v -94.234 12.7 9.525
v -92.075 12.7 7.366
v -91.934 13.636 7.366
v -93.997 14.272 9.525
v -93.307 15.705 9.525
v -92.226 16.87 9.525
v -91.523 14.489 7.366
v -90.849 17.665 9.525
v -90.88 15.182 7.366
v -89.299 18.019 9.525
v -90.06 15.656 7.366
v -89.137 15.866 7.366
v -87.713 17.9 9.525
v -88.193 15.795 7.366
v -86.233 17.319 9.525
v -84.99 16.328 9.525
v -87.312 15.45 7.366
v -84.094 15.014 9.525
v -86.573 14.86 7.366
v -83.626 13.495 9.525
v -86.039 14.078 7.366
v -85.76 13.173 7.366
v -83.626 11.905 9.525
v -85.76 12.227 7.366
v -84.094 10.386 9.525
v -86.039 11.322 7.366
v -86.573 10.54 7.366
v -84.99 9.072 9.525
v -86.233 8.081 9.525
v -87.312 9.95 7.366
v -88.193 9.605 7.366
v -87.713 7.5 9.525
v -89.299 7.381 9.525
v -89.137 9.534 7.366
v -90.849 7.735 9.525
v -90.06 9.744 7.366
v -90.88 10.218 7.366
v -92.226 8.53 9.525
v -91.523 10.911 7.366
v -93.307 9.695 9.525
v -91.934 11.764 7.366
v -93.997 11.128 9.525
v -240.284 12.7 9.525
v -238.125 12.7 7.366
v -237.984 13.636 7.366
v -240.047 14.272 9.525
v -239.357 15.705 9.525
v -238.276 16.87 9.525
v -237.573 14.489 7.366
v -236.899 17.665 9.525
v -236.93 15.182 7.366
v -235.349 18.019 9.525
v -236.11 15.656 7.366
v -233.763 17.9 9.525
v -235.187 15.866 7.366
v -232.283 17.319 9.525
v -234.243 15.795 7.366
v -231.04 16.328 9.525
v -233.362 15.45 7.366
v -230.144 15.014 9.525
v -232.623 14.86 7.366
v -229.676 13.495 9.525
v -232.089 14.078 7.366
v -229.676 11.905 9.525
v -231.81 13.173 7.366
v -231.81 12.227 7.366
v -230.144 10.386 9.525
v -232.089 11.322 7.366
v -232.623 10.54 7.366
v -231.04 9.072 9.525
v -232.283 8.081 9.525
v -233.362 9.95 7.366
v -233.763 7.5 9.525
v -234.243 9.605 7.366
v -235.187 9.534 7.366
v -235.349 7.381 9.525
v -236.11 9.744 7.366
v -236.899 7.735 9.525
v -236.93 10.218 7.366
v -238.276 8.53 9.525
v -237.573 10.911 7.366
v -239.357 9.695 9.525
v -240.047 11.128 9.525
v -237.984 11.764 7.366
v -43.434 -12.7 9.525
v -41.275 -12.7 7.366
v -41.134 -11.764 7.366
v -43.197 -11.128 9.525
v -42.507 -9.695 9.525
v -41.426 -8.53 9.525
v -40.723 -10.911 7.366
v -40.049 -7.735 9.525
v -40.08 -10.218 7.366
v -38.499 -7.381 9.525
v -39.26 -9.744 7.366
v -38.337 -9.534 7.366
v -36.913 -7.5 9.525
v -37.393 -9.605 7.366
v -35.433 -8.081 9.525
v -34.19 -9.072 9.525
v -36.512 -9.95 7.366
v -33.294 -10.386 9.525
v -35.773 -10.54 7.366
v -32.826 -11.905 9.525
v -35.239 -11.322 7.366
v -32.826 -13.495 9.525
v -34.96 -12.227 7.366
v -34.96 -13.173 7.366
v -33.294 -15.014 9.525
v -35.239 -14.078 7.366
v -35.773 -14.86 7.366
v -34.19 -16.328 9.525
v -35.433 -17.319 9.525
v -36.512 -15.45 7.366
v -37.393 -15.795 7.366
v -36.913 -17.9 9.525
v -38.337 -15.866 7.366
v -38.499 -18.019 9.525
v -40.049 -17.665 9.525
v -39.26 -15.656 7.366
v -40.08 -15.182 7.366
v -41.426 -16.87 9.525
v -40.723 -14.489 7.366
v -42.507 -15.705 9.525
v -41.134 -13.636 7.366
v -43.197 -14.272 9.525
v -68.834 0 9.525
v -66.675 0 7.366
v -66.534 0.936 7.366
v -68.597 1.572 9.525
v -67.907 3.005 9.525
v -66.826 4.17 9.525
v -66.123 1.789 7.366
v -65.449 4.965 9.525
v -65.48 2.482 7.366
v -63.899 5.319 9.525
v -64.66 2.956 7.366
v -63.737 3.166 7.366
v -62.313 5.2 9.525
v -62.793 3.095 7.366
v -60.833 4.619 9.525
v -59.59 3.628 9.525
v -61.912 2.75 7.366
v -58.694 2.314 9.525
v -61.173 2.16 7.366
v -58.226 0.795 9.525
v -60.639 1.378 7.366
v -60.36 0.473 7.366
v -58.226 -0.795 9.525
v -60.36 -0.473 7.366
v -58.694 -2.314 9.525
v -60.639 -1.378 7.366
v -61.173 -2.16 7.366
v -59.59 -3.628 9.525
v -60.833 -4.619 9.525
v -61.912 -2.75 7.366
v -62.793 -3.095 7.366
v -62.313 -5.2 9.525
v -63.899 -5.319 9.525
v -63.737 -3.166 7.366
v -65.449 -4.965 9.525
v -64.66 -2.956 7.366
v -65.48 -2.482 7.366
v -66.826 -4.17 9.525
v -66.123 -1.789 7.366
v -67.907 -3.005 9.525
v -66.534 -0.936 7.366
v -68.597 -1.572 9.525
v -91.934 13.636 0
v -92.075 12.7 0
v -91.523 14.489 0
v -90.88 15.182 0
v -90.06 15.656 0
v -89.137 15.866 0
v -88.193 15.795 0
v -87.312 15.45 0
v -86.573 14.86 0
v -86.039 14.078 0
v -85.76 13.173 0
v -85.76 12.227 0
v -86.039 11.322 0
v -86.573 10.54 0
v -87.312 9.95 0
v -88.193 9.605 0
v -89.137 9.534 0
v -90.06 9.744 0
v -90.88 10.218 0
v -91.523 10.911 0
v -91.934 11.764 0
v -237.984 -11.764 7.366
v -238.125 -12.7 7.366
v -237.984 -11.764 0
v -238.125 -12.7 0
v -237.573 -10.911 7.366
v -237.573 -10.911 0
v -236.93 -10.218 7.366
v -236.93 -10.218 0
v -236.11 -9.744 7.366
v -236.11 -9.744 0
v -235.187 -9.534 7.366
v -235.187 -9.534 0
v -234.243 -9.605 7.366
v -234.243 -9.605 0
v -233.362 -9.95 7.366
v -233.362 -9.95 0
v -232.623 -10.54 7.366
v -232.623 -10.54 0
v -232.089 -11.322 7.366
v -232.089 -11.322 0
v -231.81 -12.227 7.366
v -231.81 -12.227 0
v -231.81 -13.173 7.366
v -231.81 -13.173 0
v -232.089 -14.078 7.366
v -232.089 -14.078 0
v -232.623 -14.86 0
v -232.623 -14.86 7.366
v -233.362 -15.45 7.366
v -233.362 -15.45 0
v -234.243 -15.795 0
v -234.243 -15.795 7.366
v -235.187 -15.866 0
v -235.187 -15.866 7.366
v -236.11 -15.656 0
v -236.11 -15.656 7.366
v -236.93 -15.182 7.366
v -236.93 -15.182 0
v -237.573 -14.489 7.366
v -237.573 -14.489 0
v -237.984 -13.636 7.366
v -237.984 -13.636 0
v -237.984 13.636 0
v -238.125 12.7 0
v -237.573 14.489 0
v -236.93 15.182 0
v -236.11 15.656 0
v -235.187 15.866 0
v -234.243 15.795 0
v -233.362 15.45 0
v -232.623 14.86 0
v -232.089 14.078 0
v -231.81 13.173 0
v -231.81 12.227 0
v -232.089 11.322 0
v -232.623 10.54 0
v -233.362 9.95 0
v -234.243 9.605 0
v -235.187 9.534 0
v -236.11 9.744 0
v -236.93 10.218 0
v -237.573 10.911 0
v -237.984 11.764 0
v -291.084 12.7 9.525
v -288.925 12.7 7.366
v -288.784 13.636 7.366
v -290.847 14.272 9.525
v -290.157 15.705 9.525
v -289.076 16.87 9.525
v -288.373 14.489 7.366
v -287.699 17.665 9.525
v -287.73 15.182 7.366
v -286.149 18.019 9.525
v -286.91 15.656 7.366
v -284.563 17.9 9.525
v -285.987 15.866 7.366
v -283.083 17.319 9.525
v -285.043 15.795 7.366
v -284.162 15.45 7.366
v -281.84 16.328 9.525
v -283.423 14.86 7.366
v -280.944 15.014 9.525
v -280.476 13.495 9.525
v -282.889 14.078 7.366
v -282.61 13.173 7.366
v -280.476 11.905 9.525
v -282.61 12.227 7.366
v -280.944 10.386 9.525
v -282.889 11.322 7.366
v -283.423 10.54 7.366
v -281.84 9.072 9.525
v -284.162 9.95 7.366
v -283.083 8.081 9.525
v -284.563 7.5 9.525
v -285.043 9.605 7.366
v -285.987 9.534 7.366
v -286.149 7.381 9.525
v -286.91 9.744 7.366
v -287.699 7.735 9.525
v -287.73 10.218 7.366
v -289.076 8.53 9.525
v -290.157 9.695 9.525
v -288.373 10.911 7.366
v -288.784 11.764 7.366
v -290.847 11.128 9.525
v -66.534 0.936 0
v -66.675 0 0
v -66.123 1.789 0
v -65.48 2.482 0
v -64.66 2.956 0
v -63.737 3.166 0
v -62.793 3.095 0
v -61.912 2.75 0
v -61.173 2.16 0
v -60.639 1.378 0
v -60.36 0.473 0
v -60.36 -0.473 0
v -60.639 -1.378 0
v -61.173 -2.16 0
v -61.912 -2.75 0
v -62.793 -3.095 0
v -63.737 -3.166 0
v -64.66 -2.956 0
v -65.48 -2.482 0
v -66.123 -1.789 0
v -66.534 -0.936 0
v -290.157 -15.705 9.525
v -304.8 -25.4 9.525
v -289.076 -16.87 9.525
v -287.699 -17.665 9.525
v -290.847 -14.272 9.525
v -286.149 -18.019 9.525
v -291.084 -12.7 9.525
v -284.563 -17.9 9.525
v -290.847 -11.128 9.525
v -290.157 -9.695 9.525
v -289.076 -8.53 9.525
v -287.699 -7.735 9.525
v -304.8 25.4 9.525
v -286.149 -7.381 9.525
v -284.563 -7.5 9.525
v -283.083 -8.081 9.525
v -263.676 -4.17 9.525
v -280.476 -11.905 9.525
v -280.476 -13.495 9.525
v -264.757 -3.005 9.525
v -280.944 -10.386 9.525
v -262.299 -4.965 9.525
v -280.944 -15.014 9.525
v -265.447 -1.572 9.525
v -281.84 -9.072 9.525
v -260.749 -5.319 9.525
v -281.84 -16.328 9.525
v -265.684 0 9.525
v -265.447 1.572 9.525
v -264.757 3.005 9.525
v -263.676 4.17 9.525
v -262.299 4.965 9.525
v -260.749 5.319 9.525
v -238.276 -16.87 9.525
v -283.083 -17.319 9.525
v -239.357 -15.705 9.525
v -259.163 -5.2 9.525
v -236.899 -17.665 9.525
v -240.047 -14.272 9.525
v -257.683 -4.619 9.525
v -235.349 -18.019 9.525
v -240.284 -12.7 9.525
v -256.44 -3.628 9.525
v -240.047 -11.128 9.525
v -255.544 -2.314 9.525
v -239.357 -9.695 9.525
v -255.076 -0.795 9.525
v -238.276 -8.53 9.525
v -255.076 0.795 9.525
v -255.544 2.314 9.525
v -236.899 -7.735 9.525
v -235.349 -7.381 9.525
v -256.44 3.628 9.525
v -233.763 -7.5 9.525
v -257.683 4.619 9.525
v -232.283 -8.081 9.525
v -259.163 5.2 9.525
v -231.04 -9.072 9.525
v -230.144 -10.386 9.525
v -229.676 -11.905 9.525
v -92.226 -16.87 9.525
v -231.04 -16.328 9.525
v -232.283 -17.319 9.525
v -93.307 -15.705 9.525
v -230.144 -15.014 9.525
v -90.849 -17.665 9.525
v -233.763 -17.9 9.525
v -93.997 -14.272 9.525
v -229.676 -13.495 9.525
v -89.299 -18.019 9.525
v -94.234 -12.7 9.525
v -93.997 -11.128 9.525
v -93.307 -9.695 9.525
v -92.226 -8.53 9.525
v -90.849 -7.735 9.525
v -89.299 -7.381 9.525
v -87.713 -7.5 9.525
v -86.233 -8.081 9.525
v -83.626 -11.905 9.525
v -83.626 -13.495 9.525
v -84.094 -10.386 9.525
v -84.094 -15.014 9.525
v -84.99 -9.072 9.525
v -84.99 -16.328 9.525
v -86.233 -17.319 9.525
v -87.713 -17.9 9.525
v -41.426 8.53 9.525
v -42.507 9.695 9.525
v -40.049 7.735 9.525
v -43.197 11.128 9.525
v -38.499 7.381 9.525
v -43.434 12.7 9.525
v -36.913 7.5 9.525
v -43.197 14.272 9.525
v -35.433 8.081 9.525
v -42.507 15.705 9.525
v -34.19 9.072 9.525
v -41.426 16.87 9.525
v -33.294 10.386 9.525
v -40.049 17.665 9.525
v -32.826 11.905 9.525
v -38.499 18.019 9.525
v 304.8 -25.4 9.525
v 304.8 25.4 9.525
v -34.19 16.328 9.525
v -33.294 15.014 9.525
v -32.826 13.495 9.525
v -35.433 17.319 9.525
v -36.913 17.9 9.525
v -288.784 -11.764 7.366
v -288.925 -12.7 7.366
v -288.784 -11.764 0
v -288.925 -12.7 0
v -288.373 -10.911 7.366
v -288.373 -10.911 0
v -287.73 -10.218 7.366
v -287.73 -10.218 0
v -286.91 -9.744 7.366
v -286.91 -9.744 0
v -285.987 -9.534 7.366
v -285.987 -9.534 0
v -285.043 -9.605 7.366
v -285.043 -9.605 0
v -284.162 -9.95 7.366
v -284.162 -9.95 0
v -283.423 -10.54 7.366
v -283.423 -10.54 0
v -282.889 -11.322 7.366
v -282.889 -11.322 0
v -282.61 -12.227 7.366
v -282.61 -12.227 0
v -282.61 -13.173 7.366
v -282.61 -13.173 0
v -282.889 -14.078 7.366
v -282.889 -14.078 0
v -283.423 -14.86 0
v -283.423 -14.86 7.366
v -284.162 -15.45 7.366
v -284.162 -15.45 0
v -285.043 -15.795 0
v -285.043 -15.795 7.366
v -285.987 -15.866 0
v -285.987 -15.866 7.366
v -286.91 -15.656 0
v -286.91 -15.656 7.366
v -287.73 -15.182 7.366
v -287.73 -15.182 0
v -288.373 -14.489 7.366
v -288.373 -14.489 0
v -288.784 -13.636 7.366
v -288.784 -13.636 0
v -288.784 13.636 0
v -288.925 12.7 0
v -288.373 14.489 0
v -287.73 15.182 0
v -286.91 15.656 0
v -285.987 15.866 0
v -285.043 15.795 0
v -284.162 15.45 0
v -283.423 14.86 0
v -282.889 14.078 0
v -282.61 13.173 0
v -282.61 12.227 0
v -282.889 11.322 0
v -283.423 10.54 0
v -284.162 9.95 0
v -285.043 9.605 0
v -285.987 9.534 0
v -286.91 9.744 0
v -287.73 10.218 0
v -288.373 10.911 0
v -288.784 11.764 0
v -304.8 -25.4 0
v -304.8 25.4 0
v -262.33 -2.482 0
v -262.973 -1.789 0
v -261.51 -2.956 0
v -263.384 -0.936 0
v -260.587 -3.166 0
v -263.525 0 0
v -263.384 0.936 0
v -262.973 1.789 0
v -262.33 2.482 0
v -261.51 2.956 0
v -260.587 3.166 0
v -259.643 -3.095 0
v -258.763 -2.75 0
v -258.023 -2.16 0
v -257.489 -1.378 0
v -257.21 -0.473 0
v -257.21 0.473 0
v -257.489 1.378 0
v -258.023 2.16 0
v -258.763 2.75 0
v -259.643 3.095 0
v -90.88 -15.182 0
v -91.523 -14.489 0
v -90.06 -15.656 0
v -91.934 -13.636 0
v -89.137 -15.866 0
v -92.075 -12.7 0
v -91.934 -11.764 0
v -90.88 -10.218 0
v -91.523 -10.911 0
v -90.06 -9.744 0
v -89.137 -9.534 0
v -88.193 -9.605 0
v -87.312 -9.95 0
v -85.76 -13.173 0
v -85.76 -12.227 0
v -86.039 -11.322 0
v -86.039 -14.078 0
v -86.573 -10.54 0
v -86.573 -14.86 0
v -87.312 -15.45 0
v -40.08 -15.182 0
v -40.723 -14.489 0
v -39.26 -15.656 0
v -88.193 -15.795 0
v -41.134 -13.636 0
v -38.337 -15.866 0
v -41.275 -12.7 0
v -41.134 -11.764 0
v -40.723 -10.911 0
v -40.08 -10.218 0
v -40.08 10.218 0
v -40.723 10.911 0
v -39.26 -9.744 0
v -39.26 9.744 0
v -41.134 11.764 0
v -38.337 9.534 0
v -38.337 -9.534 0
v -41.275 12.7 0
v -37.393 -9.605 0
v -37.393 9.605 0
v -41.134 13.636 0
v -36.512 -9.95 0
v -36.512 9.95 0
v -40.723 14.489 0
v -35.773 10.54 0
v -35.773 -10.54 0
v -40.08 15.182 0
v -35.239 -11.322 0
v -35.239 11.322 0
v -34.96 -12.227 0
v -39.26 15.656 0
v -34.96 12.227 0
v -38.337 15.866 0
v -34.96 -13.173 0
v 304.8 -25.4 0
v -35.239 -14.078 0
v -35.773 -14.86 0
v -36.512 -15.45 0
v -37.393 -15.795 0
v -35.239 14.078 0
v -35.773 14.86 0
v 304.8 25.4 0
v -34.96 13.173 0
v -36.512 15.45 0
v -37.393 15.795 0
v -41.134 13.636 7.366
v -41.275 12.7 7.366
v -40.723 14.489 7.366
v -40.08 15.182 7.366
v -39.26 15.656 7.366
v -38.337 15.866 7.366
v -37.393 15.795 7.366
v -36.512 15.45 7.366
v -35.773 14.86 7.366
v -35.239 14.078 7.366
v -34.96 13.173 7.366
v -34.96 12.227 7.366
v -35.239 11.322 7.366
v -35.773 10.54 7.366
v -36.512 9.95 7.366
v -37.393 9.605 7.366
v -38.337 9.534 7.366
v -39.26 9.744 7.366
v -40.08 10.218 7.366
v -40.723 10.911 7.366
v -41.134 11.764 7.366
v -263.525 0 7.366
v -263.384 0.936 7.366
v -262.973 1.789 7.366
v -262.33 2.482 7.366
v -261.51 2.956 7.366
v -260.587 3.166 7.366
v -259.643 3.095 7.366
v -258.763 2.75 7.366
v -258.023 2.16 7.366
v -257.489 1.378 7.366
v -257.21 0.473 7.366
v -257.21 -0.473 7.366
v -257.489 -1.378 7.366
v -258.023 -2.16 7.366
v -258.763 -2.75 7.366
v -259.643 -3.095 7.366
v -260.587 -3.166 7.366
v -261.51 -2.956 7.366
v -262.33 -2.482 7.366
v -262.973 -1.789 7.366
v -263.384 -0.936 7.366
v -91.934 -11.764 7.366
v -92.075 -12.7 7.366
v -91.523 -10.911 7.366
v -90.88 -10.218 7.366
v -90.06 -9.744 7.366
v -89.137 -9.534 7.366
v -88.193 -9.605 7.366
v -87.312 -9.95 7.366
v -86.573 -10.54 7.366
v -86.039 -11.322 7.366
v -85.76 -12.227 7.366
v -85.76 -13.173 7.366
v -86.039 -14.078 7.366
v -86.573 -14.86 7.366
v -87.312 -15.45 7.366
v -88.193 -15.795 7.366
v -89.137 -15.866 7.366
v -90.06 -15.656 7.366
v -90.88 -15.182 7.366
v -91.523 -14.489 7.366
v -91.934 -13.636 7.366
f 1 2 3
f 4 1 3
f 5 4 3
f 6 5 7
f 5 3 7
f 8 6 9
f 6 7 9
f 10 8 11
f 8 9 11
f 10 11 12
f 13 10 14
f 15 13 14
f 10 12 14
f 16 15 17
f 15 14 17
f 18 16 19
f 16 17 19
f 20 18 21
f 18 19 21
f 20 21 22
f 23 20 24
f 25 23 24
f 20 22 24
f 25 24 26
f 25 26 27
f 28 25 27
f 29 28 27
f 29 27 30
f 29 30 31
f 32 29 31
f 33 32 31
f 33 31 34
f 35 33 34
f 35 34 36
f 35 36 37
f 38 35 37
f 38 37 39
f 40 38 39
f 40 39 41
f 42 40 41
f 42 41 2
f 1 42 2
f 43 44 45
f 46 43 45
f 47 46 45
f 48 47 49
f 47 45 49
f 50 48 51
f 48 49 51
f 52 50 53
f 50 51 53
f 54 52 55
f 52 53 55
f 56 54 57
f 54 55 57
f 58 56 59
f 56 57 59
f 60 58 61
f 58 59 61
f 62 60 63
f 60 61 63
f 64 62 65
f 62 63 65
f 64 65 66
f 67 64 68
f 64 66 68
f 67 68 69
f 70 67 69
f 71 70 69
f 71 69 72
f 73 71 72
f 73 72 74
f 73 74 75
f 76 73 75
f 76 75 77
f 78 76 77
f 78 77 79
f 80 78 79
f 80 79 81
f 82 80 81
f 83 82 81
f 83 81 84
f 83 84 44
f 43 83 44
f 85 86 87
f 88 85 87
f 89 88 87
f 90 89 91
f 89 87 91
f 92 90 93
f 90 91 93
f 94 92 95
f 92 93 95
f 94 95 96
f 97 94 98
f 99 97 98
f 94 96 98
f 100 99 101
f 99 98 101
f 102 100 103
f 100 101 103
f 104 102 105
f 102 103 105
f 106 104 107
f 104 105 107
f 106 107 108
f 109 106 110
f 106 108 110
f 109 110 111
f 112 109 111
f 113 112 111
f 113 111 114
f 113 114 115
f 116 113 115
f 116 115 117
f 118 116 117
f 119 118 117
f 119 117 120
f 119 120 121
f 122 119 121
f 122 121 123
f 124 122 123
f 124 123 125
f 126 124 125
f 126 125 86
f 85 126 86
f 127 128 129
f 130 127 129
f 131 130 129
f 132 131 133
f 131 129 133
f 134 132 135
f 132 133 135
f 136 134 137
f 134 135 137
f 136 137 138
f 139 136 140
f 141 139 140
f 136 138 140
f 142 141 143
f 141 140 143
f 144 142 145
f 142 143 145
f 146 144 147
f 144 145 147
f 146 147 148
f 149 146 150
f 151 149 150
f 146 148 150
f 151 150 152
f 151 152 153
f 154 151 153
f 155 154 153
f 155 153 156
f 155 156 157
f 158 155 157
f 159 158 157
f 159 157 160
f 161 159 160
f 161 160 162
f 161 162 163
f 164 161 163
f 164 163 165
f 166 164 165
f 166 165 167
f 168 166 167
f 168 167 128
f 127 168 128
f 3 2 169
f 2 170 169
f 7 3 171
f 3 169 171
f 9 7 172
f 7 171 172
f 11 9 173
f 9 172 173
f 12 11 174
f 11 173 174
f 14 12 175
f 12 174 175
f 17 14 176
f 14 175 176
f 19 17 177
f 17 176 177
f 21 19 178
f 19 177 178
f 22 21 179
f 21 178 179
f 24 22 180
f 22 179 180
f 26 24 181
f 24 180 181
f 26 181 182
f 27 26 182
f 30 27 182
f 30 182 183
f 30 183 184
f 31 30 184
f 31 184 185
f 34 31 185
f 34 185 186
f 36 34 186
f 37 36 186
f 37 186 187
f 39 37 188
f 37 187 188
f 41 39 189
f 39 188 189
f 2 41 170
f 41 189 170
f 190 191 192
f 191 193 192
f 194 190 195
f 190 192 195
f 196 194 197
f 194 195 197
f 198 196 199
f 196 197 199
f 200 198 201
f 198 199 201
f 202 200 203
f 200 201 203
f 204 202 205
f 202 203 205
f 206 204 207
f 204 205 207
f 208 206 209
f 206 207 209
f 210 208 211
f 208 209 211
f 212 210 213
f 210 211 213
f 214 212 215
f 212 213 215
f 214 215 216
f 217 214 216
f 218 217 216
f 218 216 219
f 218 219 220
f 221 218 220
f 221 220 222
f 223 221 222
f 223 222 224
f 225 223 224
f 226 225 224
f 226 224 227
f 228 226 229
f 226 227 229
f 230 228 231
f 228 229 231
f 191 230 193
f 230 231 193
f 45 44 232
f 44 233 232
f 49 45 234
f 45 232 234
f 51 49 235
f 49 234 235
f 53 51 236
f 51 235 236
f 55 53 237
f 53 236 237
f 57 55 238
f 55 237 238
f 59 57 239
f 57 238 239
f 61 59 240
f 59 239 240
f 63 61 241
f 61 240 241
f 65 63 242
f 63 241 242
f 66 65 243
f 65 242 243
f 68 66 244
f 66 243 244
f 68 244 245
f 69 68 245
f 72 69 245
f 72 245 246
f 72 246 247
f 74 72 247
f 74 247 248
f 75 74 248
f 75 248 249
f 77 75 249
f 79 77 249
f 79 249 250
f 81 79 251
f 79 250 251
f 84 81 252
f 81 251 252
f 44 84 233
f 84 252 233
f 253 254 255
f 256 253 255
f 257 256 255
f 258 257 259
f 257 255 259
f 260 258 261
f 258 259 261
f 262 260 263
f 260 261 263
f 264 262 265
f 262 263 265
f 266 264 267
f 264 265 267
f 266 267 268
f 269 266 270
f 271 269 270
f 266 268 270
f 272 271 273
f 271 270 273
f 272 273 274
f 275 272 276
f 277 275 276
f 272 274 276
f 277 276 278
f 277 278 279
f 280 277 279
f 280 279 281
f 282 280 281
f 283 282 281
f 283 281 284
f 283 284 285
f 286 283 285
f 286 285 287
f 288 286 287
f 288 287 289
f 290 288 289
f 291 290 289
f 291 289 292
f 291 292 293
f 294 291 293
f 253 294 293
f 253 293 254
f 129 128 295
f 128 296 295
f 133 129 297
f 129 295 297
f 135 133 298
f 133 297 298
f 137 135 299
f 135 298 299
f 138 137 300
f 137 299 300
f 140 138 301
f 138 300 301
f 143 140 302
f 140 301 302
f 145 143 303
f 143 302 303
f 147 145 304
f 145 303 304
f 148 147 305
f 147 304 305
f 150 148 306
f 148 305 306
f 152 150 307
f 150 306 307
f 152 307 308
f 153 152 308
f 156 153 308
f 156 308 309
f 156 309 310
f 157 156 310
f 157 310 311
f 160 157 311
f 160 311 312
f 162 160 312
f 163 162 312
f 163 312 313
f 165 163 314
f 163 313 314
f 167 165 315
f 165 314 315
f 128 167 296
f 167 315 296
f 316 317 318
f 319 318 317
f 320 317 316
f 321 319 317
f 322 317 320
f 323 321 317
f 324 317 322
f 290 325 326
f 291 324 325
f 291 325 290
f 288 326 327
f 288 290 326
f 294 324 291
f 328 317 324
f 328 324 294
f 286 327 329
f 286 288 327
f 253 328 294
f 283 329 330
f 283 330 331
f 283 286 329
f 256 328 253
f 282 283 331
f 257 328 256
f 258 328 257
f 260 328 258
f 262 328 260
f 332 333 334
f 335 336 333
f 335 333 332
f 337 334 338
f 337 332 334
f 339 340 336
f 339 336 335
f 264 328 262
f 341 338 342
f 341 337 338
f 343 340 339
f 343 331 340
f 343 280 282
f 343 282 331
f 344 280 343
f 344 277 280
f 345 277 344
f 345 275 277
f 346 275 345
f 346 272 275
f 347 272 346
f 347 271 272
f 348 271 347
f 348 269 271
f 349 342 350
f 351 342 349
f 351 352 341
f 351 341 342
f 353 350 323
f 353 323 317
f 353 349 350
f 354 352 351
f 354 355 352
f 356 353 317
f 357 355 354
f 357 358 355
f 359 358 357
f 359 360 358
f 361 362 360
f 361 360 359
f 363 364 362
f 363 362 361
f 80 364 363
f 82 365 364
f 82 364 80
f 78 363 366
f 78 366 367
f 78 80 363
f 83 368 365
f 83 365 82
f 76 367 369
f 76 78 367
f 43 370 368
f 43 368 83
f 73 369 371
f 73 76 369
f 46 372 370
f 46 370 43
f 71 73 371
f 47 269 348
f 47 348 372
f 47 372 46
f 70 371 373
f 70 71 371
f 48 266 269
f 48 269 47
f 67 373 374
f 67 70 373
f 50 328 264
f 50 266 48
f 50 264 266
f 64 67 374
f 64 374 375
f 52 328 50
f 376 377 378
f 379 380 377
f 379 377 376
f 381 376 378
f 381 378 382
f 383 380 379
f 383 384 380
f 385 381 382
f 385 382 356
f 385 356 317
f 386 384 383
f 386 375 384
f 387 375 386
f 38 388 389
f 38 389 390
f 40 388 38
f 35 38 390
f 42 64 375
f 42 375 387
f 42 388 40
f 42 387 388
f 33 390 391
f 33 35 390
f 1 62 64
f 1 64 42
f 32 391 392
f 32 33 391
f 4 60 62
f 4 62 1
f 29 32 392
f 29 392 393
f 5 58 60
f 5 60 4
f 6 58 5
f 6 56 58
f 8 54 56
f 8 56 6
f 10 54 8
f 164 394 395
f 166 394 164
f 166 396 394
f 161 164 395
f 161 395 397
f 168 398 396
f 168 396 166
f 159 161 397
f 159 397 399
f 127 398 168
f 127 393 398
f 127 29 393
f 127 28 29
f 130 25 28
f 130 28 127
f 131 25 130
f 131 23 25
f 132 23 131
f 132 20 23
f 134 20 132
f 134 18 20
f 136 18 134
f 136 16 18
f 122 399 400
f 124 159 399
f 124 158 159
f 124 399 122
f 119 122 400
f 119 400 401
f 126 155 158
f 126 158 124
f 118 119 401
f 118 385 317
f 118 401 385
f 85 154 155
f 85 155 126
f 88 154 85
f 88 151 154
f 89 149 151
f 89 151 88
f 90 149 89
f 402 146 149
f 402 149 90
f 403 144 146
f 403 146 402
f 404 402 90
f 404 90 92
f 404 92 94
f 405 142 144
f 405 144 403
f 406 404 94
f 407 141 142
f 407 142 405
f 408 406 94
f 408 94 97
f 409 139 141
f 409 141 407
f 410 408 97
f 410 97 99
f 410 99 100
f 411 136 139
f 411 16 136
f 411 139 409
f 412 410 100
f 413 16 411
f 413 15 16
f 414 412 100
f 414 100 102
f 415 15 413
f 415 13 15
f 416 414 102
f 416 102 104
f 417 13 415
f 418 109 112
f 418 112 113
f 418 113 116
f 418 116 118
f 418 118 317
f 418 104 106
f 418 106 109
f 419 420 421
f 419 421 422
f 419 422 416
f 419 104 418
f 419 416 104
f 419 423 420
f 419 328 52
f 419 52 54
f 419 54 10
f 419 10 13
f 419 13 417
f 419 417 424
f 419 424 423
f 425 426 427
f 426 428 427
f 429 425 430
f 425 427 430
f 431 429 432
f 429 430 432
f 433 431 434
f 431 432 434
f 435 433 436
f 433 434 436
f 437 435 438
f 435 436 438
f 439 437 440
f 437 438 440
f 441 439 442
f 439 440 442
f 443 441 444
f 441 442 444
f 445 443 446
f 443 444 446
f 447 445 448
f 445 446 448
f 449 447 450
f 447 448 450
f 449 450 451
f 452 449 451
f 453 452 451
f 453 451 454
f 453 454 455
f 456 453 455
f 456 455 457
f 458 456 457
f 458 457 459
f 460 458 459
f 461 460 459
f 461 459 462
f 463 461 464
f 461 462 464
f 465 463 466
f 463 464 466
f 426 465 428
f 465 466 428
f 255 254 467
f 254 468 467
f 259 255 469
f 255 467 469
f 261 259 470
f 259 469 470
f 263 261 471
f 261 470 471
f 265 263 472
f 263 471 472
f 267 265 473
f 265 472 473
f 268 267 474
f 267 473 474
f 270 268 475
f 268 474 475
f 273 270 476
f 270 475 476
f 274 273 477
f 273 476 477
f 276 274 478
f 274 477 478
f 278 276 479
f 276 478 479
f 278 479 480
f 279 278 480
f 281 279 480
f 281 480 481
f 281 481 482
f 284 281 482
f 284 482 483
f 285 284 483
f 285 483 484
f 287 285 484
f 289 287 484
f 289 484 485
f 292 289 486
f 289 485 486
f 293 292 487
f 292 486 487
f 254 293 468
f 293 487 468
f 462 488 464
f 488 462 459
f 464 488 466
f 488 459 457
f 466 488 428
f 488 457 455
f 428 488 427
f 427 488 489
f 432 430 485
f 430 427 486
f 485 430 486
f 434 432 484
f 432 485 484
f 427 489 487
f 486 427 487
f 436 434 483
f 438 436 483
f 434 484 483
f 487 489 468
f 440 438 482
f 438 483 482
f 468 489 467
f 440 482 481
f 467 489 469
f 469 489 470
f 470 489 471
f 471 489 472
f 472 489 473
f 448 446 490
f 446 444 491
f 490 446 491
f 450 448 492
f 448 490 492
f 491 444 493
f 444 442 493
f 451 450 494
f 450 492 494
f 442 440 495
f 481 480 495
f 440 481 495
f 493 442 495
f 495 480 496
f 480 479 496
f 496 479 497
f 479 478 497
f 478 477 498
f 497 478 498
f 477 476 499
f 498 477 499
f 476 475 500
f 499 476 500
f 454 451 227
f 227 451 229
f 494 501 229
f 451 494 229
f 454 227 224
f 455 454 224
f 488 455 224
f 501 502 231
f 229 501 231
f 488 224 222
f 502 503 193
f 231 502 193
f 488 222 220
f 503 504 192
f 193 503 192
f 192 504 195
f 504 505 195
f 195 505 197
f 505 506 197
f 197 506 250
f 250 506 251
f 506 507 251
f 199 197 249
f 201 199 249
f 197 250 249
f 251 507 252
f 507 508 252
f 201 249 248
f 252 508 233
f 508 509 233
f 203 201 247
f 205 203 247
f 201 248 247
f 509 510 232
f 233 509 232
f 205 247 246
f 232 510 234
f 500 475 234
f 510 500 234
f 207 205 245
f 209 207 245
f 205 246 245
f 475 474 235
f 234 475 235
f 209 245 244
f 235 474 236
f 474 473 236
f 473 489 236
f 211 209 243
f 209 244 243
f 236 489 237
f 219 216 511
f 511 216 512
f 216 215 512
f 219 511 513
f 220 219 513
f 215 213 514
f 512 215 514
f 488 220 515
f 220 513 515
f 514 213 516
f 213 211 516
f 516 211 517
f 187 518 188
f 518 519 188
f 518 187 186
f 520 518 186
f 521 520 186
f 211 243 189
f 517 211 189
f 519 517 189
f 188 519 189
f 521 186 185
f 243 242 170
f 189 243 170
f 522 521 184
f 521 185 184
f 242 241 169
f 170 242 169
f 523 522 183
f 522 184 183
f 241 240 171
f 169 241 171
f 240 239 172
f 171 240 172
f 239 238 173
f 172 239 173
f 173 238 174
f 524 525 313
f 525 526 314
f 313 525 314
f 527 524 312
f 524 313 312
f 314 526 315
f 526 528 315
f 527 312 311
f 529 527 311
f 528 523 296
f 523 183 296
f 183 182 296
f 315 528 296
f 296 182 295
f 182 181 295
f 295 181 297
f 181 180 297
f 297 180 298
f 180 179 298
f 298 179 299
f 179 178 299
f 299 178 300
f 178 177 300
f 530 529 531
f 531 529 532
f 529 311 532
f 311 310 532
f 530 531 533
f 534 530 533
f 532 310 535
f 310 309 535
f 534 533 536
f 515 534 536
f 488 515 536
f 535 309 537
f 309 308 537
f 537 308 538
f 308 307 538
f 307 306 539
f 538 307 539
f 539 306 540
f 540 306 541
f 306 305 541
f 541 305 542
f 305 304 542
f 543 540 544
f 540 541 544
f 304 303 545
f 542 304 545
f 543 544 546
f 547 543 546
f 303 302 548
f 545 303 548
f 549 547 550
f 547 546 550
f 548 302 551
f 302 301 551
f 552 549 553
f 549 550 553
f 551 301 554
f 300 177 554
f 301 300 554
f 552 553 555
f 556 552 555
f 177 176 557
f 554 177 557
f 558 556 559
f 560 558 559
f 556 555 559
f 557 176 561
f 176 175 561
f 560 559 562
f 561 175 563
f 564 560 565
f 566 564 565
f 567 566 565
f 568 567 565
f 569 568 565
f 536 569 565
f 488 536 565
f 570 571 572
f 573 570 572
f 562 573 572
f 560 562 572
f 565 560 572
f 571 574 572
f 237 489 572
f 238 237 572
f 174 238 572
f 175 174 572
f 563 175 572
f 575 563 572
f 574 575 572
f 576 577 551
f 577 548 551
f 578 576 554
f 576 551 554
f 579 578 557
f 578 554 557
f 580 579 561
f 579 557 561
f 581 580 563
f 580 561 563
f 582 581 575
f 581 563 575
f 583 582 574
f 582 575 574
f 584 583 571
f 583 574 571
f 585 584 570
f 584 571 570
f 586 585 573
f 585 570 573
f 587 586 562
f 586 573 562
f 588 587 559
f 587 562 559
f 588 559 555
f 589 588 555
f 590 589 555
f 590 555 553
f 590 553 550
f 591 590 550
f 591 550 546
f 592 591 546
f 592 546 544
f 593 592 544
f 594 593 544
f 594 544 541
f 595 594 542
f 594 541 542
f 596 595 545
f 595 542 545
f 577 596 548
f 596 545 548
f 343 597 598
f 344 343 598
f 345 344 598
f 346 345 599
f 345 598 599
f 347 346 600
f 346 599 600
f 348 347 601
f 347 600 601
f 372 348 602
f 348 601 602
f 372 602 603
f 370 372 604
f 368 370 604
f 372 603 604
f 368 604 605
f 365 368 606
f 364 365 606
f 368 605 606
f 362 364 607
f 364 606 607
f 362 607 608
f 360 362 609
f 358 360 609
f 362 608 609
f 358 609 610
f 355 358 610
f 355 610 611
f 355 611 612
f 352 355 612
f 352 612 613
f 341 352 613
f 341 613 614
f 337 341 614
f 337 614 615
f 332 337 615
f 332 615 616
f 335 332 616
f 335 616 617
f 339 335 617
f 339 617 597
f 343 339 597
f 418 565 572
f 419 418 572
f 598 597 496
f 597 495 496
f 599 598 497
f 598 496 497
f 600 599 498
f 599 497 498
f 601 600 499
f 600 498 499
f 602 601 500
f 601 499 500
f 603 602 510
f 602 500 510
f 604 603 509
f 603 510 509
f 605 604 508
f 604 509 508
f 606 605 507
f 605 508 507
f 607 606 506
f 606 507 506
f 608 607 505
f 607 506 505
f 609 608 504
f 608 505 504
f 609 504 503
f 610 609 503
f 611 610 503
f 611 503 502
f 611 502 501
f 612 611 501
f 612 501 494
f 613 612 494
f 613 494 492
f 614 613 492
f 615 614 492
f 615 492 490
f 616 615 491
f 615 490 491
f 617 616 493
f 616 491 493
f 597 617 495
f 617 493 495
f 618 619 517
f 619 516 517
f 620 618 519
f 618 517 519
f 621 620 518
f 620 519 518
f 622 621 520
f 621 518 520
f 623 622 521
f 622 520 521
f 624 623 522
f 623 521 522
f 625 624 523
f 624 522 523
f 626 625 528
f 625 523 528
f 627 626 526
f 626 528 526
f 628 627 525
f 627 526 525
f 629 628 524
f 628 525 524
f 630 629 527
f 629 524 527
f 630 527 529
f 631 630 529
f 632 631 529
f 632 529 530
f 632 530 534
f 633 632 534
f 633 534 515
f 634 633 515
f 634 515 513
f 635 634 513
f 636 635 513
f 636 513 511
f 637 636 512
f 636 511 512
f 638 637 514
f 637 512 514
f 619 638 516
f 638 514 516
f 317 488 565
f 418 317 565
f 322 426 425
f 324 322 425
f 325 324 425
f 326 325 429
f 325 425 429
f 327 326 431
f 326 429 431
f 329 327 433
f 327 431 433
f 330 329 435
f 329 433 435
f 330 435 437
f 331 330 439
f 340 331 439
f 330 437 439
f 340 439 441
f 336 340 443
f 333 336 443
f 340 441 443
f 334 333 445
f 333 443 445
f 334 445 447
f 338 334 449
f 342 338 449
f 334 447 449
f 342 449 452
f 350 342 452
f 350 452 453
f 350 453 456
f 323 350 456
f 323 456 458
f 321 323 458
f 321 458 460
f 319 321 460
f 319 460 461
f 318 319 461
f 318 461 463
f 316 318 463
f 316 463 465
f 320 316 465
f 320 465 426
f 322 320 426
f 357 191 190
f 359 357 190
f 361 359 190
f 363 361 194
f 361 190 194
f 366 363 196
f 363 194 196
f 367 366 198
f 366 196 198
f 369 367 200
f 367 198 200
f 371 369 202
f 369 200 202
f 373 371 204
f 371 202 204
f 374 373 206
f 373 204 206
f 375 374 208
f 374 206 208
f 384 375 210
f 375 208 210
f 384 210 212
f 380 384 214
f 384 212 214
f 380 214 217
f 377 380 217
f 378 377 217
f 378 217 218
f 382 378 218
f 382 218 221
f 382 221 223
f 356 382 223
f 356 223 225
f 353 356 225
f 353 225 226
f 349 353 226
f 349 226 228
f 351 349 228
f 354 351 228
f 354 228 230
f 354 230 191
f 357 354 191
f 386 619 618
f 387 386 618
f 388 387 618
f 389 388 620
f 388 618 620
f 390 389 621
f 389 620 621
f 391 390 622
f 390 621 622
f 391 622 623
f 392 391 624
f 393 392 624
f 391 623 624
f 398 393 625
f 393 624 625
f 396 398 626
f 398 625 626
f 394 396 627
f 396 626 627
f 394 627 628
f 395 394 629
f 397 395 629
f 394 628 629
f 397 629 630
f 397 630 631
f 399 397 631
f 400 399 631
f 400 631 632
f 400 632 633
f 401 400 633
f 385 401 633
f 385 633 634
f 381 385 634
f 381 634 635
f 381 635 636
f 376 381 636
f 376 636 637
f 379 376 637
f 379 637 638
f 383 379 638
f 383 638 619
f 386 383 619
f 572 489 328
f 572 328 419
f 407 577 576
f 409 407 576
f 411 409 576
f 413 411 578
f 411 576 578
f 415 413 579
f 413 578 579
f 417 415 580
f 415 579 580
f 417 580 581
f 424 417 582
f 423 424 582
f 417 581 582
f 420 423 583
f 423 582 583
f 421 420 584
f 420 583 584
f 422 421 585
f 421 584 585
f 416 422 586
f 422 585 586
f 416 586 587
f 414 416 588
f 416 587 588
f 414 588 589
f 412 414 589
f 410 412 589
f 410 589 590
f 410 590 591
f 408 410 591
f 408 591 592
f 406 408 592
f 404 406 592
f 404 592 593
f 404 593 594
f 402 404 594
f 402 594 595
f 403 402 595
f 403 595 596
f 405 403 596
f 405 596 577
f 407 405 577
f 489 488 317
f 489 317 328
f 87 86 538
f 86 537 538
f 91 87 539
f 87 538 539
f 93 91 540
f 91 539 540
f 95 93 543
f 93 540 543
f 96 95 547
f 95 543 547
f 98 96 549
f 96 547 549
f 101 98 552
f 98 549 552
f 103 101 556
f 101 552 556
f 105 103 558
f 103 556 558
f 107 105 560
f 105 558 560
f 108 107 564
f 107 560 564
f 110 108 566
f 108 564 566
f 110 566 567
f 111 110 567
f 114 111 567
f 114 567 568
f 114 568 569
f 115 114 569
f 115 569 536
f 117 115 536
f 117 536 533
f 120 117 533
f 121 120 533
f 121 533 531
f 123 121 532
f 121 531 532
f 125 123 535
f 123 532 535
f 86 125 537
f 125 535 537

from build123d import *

# Parameters (mm, degrees)
F0_W           = 609.6
F0_H           = 50.8
F1_DEPTH       = 9.525
F3_D           = 6.35
F3_CSINK_D     = 10.668
F3_CSINK_ANGLE = 90
F4_D           = 6.35
F4_CSINK_D     = 10.668
F4_CSINK_ANGLE = 90


with BuildPart() as f1:
    # F0 (on Top) → F1 (new body)
    with BuildSketch(Plane.XY):
        Rectangle(F0_W, F0_H)
    extrude(amount=F1_DEPTH)

    # F3 (through all)
    with Locations(Plane.XY.offset(9.525)):
        with Locations((-285.75, -12.7), (-285.75, 12.7), (-260.35, 0), (-234.95, -12.7), (-234.95, 12.7)):
            CounterSinkHole(F3_D / 2, F3_CSINK_D / 2, counter_sink_angle=F3_CSINK_ANGLE)

    # F4 (through all)
    with Locations(Plane.XY.offset(9.525)):
        with Locations((-88.9, 12.7), (-88.9, -12.7), (-63.5, 0), (-38.1, 12.7), (-38.1, -12.7)):
            CounterSinkHole(F4_D / 2, F4_CSINK_D / 2, counter_sink_angle=F4_CSINK_ANGLE)


solid = f1.part
